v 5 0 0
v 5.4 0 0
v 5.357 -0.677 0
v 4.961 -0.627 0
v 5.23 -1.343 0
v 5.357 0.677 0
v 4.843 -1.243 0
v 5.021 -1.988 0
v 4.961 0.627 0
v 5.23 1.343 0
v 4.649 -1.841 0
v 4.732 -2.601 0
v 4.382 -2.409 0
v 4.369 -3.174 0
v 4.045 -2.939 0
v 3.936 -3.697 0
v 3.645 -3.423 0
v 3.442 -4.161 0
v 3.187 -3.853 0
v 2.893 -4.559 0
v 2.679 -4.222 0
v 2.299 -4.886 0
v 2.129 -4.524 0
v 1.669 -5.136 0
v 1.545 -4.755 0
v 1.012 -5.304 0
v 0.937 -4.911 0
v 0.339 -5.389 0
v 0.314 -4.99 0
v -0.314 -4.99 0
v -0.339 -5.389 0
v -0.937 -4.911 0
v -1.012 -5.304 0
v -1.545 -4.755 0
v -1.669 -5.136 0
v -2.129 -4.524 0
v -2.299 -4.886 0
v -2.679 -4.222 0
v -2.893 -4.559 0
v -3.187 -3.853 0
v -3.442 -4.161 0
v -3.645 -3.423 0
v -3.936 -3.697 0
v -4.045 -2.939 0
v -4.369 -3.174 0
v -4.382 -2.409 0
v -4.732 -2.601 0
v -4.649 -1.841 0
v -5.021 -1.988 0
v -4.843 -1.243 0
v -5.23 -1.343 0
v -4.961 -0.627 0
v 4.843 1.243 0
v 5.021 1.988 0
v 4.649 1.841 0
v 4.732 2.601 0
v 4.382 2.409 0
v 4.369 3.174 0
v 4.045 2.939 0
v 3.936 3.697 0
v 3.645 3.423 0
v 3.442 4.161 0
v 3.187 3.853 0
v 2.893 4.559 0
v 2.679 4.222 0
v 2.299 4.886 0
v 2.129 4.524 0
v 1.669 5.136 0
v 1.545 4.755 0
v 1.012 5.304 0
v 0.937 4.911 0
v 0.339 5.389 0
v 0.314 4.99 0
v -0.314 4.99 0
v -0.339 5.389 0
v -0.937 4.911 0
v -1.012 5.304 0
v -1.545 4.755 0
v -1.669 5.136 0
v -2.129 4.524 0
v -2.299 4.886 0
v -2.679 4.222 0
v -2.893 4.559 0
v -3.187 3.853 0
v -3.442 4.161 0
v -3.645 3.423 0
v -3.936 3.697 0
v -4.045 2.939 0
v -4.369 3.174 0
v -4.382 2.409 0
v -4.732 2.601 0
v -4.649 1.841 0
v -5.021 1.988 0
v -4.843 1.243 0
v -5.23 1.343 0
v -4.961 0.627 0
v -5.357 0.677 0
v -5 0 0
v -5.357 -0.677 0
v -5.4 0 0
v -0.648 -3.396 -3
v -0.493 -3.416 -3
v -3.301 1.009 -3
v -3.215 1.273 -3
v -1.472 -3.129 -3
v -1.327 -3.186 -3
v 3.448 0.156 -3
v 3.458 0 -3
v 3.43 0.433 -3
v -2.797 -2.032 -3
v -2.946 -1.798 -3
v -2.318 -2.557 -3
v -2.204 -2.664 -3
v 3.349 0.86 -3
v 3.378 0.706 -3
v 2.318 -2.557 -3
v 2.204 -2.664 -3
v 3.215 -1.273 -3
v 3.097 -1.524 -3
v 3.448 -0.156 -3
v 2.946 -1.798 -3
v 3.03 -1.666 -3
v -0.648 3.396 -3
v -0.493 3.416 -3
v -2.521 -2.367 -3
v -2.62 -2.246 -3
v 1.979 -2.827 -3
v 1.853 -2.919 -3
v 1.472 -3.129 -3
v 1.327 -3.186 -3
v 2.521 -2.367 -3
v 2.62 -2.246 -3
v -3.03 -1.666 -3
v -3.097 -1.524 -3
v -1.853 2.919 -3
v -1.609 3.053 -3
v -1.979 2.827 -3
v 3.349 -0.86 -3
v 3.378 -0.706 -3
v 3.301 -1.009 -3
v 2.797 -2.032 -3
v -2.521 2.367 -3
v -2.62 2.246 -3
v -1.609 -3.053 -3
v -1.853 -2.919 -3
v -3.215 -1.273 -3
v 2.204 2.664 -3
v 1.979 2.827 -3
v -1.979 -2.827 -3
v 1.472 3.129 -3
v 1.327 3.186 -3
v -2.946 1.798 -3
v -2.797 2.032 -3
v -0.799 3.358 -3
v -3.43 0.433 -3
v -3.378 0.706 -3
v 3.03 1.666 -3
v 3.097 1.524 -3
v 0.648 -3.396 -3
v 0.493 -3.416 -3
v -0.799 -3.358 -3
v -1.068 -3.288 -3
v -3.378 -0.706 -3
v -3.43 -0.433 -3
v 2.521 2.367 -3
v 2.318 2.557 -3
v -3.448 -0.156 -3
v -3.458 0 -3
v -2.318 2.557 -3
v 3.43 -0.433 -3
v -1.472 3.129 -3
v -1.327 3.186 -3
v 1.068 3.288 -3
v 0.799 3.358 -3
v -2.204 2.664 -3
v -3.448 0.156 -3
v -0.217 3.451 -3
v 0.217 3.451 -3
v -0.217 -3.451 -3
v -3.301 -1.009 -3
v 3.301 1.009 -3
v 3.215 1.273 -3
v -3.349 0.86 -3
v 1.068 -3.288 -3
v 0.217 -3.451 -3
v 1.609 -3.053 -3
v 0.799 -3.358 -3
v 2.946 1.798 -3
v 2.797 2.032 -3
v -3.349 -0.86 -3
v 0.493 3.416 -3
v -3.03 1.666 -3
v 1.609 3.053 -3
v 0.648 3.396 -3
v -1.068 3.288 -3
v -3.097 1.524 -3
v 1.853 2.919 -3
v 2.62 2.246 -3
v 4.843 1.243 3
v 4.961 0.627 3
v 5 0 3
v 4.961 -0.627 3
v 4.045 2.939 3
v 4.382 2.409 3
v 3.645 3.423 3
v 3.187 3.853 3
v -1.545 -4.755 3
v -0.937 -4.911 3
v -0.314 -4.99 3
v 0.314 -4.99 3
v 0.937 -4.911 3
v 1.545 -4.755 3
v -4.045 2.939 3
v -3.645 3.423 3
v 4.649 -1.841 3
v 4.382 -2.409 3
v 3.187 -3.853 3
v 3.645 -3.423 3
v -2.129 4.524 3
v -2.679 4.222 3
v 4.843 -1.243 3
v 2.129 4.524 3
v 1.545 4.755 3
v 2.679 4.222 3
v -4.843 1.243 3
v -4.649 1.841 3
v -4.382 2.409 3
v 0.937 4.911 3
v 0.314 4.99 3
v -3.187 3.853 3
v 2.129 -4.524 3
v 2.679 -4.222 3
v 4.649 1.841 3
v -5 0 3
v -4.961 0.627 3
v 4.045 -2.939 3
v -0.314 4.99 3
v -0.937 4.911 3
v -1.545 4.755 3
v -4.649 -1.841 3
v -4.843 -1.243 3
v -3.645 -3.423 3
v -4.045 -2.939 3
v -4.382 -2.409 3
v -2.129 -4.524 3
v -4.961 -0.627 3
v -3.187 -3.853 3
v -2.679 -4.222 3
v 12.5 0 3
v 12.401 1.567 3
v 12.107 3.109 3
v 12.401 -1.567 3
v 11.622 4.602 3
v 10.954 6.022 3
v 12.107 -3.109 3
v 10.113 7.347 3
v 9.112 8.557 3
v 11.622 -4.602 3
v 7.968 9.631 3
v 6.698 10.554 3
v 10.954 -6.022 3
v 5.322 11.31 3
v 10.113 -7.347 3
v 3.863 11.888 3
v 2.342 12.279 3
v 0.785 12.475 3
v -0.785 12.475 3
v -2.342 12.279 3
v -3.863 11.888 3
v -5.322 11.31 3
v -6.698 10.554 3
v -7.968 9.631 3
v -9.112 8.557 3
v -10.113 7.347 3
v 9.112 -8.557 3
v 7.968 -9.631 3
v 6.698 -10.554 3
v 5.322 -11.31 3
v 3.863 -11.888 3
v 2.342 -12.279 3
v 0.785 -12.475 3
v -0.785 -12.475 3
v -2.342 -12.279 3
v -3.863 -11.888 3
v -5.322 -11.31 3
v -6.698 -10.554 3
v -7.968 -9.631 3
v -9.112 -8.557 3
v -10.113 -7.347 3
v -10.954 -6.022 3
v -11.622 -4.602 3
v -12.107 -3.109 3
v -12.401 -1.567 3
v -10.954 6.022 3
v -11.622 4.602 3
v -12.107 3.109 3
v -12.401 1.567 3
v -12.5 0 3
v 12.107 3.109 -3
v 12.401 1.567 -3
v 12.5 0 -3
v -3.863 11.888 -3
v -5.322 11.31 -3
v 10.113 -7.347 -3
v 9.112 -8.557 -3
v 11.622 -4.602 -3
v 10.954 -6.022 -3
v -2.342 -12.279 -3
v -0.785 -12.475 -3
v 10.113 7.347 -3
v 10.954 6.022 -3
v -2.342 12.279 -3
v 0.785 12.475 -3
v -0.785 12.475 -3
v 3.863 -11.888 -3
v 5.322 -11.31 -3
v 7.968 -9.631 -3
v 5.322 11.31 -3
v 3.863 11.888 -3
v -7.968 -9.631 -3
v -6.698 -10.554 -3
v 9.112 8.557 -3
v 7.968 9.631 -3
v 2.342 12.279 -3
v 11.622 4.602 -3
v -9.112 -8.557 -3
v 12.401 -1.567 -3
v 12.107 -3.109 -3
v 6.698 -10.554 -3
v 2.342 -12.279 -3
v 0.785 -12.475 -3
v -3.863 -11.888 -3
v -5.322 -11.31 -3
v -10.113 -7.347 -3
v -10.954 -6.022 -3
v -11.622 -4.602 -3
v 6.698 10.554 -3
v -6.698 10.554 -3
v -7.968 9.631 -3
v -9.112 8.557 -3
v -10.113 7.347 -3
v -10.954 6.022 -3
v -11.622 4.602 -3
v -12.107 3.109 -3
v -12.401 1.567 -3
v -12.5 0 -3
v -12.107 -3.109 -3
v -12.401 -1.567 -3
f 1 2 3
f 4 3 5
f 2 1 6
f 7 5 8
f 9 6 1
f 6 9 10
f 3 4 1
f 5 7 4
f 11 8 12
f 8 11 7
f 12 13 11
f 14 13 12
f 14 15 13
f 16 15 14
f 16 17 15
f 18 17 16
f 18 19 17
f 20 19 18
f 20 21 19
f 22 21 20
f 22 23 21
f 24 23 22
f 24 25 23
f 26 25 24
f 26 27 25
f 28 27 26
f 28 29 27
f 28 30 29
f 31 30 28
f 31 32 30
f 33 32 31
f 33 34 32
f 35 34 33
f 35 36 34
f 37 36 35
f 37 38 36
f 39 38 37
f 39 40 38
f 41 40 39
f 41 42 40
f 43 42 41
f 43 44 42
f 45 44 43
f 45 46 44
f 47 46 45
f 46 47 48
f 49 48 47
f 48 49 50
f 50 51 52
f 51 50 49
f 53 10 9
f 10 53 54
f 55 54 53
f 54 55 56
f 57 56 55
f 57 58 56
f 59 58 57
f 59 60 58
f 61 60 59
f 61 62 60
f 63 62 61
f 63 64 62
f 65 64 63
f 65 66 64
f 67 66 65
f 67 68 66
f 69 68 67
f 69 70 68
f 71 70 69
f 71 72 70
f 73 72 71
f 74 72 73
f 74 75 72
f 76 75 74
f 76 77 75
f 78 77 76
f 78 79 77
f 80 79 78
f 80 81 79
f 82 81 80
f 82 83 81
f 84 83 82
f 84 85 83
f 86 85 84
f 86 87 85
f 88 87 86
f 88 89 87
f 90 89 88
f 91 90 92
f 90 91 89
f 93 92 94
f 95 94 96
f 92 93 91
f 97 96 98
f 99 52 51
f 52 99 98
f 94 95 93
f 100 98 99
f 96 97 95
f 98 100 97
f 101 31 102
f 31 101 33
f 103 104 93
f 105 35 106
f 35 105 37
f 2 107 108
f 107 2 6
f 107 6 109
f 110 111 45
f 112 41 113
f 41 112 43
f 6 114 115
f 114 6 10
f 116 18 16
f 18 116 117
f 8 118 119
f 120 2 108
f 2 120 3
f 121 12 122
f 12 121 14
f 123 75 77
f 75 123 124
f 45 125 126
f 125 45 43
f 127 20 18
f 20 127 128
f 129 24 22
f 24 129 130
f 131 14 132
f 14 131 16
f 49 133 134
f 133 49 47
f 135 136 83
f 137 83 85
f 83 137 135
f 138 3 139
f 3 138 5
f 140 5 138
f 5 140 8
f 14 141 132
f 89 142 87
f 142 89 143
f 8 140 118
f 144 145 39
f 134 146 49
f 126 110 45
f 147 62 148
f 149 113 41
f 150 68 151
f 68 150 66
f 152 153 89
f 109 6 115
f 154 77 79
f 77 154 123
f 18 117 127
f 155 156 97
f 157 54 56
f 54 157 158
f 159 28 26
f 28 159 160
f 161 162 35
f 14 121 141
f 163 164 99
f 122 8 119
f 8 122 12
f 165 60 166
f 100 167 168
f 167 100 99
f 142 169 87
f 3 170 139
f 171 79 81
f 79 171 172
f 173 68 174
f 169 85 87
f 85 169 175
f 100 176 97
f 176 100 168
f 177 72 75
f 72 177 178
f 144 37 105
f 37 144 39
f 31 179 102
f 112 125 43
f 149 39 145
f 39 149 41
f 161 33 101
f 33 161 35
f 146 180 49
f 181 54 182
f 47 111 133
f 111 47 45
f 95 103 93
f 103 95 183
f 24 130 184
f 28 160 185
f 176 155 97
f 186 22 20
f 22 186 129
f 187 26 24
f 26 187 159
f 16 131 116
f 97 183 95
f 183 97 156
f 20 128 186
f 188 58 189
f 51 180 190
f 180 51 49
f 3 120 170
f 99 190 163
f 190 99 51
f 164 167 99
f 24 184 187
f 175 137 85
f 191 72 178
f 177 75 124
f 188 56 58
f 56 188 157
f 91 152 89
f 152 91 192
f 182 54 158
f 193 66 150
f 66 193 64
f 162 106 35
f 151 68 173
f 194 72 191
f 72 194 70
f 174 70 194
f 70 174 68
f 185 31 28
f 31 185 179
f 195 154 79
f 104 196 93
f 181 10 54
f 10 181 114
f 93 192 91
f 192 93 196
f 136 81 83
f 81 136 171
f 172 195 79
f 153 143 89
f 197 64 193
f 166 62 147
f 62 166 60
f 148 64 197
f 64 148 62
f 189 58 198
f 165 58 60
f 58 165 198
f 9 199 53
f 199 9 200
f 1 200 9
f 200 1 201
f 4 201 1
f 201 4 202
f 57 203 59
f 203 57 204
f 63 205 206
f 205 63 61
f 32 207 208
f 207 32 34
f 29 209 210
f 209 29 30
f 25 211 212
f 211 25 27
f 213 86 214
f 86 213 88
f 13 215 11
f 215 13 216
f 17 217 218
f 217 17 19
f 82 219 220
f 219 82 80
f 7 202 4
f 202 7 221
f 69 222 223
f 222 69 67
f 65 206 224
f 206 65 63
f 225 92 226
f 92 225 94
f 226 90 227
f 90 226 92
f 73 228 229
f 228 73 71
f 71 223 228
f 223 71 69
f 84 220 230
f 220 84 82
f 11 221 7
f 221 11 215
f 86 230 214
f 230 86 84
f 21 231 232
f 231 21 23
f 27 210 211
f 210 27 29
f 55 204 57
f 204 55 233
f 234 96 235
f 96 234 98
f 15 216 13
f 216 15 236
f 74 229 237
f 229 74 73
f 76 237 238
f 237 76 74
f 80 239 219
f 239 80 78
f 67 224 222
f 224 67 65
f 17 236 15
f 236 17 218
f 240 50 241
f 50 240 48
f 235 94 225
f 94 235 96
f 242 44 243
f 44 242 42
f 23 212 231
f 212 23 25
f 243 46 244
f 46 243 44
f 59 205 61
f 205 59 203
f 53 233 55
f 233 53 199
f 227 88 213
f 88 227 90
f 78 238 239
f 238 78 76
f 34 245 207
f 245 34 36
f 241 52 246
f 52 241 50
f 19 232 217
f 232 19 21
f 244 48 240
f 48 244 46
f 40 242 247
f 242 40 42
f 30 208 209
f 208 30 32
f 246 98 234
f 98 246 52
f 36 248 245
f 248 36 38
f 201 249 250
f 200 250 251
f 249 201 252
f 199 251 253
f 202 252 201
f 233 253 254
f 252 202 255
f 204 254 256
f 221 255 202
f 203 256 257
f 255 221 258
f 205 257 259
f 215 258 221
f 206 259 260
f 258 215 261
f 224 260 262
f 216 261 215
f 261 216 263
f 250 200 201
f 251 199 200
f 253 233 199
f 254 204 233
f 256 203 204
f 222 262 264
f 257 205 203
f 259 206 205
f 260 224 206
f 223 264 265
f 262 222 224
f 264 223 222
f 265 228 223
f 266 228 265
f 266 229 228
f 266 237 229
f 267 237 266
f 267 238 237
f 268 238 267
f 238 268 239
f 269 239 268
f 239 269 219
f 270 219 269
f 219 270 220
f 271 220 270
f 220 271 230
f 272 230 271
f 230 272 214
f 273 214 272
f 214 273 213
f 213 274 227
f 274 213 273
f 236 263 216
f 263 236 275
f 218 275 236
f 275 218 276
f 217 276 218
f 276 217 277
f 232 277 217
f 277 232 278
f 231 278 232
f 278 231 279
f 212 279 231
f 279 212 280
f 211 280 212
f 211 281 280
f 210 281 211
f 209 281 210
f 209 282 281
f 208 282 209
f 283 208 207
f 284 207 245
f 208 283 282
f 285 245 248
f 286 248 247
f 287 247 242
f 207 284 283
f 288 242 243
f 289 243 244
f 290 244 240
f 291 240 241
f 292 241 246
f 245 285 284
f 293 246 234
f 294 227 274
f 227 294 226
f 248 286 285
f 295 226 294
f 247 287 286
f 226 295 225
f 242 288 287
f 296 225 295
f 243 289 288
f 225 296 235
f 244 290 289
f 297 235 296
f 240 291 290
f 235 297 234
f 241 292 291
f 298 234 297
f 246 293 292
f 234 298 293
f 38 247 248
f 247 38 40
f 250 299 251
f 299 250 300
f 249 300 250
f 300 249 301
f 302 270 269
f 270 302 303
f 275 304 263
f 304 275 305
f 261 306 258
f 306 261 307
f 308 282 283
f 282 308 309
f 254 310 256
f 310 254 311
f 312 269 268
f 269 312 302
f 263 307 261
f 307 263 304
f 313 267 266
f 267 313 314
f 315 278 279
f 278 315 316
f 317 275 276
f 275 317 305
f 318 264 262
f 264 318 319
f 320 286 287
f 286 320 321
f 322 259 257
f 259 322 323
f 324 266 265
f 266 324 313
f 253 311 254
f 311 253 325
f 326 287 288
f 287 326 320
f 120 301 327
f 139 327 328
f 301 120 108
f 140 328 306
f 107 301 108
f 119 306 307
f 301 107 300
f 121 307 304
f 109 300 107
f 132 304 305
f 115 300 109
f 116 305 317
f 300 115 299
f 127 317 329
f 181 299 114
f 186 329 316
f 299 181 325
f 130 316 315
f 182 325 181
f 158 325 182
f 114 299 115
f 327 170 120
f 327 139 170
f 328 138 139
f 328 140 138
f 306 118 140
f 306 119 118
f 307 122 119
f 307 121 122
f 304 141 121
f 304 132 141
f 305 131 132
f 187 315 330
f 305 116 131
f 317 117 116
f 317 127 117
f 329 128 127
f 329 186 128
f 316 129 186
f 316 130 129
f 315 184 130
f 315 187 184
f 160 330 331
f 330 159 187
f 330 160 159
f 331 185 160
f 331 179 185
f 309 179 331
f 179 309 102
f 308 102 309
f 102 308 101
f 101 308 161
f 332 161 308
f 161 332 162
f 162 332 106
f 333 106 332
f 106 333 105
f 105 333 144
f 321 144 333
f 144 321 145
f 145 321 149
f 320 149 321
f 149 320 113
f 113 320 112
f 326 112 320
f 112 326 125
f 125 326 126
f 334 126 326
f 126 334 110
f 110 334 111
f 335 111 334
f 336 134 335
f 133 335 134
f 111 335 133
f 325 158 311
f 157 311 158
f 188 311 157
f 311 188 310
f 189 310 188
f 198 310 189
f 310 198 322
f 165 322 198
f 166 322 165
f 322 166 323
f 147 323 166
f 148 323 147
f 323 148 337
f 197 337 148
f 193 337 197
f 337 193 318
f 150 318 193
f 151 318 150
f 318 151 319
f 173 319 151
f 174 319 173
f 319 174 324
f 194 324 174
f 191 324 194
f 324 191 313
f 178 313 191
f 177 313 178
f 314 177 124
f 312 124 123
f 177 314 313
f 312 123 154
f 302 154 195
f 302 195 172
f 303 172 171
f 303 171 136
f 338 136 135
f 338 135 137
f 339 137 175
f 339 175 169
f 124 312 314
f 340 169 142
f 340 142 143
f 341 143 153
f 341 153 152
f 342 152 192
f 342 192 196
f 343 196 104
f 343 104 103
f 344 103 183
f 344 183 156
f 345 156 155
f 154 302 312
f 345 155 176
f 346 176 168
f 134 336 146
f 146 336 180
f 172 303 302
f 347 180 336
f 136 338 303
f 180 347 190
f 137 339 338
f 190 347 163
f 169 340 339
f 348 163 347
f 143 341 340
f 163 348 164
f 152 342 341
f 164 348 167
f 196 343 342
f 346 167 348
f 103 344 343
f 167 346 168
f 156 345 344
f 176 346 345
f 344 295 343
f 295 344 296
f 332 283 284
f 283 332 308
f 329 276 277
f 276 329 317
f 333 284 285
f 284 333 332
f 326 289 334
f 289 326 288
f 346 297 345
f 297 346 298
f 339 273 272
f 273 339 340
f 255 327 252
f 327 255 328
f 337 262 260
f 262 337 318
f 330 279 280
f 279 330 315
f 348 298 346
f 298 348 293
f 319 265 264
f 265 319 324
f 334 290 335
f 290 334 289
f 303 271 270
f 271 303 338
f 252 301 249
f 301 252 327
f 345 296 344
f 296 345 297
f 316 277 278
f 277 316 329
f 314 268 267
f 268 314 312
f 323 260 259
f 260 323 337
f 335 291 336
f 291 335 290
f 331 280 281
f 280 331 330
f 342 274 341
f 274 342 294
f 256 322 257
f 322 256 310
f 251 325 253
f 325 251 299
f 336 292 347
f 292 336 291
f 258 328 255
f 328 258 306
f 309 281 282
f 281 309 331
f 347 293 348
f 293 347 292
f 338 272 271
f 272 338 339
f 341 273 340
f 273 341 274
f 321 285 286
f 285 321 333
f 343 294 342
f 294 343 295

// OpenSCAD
$fn = 50;

difference() {
	union() {
		translate(v = [0, 0, -3.0]) {
			cylinder(h = 6, r = 12.5);
		}
	}
	union() {
		translate(v = [0, 0, 0]) {
			rotate(a = [0, 0, 0]) {
				difference() {
					union() {
						translate(v = [0, 0, -6.0]) {
							cylinder(h = 6, r = 2.6);
						}
						translate(v = [0, 0, -3.9]) {
							cylinder(h = 3.9, r1 = 2.875, r2 = 5.4);
						}
						translate(v = [0, 0, -6.0]) {
							cylinder(h = 6, r = 2.875);
						}
						translate(v = [0, 0, -6.0]) {
							cylinder(h = 6, r = 2.6);
						}
					}
					union();
				}
			}
		}
		#cylinder(h = 3, r = 5.0);
	}
}
